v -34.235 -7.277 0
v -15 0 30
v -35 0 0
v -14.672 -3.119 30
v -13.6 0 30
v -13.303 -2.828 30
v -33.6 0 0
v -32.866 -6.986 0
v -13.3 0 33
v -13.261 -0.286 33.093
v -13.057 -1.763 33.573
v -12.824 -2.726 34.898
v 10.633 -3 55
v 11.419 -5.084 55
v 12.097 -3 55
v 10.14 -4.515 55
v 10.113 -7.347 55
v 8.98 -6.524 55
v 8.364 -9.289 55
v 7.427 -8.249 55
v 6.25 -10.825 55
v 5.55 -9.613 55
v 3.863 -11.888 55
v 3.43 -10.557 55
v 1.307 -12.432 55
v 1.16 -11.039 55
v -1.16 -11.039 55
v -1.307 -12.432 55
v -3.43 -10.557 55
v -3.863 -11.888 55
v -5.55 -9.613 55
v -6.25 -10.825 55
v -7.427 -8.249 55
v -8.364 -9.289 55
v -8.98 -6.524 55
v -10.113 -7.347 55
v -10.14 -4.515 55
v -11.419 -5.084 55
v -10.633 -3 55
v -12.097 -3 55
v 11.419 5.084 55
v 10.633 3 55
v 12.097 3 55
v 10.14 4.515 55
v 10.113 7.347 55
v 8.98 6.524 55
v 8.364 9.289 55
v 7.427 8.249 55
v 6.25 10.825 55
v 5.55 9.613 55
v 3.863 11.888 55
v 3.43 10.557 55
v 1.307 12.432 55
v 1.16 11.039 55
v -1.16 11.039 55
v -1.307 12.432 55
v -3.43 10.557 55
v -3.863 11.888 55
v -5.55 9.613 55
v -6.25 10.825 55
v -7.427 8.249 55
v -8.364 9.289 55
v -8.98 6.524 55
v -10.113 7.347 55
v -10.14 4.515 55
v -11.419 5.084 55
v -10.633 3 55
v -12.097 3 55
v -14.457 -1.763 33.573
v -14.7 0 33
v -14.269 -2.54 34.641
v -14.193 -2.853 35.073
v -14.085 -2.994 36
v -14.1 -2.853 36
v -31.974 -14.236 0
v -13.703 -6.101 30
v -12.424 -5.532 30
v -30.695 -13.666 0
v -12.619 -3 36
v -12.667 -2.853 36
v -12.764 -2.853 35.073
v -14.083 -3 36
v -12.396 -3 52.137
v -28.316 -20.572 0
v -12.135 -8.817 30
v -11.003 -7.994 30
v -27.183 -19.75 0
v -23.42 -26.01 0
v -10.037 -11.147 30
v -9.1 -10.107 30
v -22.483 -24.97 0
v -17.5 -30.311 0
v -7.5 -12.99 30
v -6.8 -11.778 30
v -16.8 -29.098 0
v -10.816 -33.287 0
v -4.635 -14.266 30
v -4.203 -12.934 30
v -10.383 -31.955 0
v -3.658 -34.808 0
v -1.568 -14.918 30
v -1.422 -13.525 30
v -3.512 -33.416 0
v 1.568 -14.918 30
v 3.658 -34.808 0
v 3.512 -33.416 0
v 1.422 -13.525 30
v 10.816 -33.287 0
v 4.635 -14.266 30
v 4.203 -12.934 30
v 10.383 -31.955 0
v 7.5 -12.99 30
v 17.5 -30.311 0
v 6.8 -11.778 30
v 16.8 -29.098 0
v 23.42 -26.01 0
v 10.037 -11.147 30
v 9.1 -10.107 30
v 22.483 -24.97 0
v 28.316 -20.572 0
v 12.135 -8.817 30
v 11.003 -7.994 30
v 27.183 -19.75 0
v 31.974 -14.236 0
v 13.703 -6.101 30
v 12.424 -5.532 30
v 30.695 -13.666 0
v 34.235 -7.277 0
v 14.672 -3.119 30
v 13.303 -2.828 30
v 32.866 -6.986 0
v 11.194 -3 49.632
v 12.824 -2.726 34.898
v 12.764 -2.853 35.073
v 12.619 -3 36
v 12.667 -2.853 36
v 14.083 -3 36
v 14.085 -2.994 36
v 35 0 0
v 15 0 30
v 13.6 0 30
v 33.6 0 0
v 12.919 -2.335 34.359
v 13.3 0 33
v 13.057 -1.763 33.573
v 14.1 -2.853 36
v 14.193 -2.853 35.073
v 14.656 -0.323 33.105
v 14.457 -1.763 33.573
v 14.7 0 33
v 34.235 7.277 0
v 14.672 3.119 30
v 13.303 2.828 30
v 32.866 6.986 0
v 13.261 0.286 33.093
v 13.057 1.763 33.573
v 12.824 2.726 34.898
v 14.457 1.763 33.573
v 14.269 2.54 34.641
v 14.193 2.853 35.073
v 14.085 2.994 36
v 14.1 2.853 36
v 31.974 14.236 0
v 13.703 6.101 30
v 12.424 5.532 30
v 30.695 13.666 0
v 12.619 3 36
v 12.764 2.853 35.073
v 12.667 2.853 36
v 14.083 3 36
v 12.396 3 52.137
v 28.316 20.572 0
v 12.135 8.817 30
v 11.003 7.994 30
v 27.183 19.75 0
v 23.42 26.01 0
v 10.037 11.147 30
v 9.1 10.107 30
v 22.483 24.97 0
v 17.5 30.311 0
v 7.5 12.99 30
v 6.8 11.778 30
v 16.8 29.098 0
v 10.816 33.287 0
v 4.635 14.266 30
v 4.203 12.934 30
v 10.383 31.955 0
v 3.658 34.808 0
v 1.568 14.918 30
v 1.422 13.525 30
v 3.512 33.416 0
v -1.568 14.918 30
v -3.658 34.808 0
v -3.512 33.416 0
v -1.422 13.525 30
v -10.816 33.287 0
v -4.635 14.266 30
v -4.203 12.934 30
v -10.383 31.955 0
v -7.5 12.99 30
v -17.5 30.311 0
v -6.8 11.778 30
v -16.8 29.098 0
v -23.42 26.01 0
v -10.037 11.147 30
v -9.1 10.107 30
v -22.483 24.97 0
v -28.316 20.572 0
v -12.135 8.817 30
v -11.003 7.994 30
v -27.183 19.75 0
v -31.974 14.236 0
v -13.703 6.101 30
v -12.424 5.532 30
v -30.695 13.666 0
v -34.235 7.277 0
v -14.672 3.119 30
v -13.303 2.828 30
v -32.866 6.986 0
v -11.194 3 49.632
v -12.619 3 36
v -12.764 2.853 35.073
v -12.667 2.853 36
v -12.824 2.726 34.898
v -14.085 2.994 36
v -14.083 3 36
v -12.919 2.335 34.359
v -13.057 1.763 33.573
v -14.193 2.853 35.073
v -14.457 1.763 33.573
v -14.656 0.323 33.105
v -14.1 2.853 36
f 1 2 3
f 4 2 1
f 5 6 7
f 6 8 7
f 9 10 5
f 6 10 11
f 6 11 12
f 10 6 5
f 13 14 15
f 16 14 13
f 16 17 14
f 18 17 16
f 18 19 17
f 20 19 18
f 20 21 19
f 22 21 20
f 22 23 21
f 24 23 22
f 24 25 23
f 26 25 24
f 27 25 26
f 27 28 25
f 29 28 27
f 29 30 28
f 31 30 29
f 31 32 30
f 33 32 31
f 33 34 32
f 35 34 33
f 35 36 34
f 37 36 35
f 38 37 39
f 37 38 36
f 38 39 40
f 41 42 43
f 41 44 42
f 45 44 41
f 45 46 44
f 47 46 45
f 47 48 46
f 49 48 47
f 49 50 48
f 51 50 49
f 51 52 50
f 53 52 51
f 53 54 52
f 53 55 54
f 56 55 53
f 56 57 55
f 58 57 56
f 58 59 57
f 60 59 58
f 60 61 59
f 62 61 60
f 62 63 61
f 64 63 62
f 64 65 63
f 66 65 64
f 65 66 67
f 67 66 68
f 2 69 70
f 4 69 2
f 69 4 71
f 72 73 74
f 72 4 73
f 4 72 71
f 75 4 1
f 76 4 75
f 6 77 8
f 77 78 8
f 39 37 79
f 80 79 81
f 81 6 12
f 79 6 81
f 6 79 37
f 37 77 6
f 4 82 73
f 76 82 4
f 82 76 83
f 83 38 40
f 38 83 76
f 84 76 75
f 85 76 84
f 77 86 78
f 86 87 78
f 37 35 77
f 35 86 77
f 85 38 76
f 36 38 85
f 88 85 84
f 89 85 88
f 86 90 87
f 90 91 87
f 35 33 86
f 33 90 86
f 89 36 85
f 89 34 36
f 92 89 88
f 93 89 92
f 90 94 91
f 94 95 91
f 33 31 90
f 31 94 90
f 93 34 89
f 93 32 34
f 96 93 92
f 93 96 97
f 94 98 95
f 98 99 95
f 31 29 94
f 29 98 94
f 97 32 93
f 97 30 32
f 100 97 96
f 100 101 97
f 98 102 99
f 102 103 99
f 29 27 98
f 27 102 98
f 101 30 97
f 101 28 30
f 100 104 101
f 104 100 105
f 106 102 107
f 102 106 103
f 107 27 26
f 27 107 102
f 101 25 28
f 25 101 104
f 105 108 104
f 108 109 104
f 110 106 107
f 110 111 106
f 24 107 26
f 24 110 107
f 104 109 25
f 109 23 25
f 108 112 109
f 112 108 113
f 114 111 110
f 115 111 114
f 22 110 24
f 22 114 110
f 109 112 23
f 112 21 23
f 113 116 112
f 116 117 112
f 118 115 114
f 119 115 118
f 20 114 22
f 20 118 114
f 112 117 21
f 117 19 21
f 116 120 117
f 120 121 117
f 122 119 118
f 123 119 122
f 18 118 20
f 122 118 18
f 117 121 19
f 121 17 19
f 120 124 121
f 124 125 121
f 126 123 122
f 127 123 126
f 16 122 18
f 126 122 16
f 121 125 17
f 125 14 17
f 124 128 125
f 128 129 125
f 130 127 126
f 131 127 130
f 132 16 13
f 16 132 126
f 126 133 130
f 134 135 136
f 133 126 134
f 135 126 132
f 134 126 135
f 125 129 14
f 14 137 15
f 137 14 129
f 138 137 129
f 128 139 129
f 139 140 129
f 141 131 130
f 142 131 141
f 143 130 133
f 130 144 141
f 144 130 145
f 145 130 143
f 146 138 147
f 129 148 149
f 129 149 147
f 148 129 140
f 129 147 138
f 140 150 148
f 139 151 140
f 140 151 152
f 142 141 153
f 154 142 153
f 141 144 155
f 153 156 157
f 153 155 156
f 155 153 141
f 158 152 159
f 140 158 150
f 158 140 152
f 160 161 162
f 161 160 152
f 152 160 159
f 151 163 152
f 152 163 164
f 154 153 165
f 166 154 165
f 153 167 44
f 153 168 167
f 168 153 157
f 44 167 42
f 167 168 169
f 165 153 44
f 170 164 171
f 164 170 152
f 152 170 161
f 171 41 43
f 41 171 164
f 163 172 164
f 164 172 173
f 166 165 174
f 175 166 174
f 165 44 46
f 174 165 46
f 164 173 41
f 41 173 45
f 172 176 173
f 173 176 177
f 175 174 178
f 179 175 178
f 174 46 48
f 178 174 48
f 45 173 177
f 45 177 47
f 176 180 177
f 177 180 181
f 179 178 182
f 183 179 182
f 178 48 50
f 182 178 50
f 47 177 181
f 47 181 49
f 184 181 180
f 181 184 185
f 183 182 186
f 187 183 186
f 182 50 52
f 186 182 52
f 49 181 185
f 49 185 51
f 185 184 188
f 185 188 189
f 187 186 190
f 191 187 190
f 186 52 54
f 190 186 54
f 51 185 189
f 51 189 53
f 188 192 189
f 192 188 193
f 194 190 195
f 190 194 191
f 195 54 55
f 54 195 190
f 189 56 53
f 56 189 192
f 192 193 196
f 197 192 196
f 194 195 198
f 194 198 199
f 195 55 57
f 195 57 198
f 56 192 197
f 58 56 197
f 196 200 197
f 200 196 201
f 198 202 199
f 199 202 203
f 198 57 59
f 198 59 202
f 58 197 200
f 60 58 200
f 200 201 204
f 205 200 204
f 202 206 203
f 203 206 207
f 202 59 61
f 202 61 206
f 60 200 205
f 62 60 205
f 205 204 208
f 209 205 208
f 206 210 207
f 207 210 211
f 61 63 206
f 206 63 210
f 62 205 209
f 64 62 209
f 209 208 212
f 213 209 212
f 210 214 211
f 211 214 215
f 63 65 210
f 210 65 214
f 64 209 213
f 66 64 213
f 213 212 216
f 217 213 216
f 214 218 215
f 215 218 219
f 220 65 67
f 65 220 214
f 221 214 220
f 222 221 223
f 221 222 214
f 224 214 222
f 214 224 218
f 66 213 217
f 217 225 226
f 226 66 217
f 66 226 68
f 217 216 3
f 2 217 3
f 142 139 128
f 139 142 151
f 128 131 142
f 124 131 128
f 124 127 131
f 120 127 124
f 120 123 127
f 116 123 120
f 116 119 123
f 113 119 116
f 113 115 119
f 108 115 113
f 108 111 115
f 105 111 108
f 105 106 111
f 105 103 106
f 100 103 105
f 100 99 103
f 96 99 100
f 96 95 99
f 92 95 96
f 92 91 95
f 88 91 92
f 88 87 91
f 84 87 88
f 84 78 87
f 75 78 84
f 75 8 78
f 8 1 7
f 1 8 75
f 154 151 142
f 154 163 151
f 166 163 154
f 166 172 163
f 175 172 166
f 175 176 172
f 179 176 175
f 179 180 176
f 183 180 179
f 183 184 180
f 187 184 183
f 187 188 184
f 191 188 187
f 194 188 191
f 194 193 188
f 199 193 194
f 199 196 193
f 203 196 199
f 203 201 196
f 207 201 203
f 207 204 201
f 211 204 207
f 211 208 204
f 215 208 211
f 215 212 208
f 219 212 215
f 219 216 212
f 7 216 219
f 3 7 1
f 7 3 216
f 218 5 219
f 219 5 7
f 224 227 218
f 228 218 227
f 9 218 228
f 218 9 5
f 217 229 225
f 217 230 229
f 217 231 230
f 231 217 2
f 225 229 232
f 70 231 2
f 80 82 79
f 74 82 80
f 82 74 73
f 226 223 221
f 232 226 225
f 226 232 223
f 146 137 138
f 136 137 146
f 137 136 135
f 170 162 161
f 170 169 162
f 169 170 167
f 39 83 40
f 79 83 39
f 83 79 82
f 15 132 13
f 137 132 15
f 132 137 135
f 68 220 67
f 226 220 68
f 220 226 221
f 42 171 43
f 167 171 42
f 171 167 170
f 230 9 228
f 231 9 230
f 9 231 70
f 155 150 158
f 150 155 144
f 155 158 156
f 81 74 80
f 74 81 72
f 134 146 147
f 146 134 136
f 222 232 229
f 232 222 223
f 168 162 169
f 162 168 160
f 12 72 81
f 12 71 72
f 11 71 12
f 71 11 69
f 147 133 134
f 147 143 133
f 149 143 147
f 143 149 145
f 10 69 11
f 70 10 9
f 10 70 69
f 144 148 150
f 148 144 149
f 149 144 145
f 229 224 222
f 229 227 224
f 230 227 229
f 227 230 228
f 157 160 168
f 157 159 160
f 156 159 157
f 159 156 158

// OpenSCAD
// The diameter at the bottom of the funnel
d0 = 25; // [5:.1:100]

// The diameter at the bend of the funnel
d1 = 30;  // [5:.1:100]

// The diameter at the top of the funnel
d2 = 70;  // [5:.1:100]

// The distance from the bottom of the funnel to the bend
h1 = 25;  // [5:.1:100]

// The distance from the bend of the funnel to the top
h2 = 30;  // [5:.1:100]

// The width of the slot
sw = 6;   // [5:.1:100]

// The thickness of the wall
th = 1.4; // [ .1:.05:5.0]


h1h2 = h1+30;

function reverse_inset_half_profile(p, dx) =
    concat(p, [for(i = [len(p)-1:-1:0]) [p[i][0]-dx, p[i][1]]]);

function half_profile() =
    [
        [d0/2, 0],
        [d1/2, h1],
        [d2/2, h1h2],
    ];

function profile() =
    reverse_inset_half_profile(half_profile(), th);

translate([0,0,h1h2])
rotate([180,0,0])
difference() {
    render() rotate_extrude(convexity=8) polygon(profile(), convexity=4);
    cube([100, sw, (h1-sw)*2], center=true);
    translate([0,0,h1-sw])
    rotate([0,90,0])
    cylinder(d=sw, h=100, center=true);
}
